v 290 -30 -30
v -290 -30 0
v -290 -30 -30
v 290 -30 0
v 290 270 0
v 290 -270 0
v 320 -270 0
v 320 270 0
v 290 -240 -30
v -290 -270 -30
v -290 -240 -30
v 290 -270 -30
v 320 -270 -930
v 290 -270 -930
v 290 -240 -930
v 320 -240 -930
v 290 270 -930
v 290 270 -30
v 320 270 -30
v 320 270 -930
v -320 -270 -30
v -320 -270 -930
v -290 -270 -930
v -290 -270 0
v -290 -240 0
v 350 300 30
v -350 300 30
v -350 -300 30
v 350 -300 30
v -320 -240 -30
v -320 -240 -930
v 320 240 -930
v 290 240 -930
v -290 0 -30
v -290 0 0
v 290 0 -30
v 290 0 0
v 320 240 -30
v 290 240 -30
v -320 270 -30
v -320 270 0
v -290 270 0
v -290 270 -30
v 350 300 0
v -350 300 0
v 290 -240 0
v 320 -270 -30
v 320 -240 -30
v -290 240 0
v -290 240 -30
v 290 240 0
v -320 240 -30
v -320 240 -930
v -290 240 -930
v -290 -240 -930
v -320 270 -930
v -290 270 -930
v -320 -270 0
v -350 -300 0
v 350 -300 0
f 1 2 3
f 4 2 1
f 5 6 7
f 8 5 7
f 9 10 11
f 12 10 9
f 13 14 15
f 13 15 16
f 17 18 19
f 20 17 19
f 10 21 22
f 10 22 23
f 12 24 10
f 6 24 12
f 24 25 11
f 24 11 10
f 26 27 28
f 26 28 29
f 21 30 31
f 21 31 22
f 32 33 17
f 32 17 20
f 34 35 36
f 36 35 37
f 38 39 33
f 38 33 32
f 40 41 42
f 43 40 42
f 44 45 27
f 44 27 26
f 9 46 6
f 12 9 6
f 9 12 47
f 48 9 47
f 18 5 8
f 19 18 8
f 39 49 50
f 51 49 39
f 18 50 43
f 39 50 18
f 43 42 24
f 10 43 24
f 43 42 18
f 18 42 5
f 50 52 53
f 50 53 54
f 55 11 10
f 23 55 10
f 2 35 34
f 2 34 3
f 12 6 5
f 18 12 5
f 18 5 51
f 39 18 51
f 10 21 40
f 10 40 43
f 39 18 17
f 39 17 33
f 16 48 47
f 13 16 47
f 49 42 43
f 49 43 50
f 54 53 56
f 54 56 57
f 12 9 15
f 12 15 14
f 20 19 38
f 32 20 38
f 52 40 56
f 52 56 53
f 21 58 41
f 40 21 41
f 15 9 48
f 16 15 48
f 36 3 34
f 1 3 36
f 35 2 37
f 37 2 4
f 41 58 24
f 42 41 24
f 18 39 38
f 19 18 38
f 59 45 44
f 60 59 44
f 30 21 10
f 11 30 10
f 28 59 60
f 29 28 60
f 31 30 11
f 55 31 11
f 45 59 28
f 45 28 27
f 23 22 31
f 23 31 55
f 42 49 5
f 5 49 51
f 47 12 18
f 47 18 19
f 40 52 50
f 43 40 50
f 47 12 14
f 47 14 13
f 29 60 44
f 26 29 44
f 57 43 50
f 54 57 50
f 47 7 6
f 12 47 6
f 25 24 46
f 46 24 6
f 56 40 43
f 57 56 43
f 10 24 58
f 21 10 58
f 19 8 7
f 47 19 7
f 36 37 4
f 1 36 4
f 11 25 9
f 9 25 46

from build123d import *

# Parameters (mm, degrees)
F0_W     = 700
F0_H     = 600
F1_DEPTH = 30
F2_W     = 580
F2_H     = 30
F3_DEPTH = 30
F4_DEPTH = 30
F5_DEPTH = 30
F6_W     = 30
F6_H     = 30
F7_DEPTH = 900


with BuildPart() as f1:
    # F0 (on Top) → F1 (new body)
    with BuildSketch(Plane.XY):
        Rectangle(F0_W, F0_H)
    extrude(amount=F1_DEPTH)


with BuildPart() as f3:
    # F2 (on face) → F3 (new body)
    with BuildSketch(Plane(origin=(0, 0, 0), x_dir=(1, 0, 0), z_dir=(0, 0, -1))):
        with Locations((0, 255)):
            Rectangle(F2_W, F2_H)
        with Locations((0, -255)):
            Rectangle(F2_W, F2_H)
    extrude(amount=F3_DEPTH)


with BuildPart() as f4:
    # F2 (on face) → F4 (new body)
    with BuildSketch(Plane(origin=(0, 0, 0), x_dir=(1, 0, 0), z_dir=(0, 0, -1))):
        Polygon((-290, 240), (-290, 270), (-320, 270), (-320, -270), (-290, -270), (-290, -240), (-290, 0), (-290, 30), align=None)
        Polygon((320, -270), (320, 270), (290, 270), (290, 240), (290, 30), (290, 0), (290, -240), (290, -270), align=None)
    extrude(amount=F4_DEPTH)


with BuildPart() as f5:
    # F2 (on face) → F5 (new body)
    with BuildSketch(Plane(origin=(0, 0, 0), x_dir=(1, 0, 0), z_dir=(0, 0, -1))):
        with Locations((0, 15)):
            Rectangle(F2_W, F2_H)
    extrude(amount=F5_DEPTH)


with BuildPart() as f7:
    # F6 (on face) → F7 (new body)
    with BuildSketch(Plane(origin=(0, 0, -30), x_dir=(1, 0, 0), z_dir=(0, 0, -1))):
        with Locations((-305, 255)):
            Rectangle(F6_W, F6_H)
        with Locations((-305, -255)):
            Rectangle(F6_W, F6_H)
        with Locations((305, -255)):
            Rectangle(F6_W, F6_H)
        with Locations((305, 255)):
            Rectangle(F6_W, F6_H)
    extrude(amount=F7_DEPTH)


solid = Compound([f1.part, f3.part, f4.part, f5.part, f7.part])
